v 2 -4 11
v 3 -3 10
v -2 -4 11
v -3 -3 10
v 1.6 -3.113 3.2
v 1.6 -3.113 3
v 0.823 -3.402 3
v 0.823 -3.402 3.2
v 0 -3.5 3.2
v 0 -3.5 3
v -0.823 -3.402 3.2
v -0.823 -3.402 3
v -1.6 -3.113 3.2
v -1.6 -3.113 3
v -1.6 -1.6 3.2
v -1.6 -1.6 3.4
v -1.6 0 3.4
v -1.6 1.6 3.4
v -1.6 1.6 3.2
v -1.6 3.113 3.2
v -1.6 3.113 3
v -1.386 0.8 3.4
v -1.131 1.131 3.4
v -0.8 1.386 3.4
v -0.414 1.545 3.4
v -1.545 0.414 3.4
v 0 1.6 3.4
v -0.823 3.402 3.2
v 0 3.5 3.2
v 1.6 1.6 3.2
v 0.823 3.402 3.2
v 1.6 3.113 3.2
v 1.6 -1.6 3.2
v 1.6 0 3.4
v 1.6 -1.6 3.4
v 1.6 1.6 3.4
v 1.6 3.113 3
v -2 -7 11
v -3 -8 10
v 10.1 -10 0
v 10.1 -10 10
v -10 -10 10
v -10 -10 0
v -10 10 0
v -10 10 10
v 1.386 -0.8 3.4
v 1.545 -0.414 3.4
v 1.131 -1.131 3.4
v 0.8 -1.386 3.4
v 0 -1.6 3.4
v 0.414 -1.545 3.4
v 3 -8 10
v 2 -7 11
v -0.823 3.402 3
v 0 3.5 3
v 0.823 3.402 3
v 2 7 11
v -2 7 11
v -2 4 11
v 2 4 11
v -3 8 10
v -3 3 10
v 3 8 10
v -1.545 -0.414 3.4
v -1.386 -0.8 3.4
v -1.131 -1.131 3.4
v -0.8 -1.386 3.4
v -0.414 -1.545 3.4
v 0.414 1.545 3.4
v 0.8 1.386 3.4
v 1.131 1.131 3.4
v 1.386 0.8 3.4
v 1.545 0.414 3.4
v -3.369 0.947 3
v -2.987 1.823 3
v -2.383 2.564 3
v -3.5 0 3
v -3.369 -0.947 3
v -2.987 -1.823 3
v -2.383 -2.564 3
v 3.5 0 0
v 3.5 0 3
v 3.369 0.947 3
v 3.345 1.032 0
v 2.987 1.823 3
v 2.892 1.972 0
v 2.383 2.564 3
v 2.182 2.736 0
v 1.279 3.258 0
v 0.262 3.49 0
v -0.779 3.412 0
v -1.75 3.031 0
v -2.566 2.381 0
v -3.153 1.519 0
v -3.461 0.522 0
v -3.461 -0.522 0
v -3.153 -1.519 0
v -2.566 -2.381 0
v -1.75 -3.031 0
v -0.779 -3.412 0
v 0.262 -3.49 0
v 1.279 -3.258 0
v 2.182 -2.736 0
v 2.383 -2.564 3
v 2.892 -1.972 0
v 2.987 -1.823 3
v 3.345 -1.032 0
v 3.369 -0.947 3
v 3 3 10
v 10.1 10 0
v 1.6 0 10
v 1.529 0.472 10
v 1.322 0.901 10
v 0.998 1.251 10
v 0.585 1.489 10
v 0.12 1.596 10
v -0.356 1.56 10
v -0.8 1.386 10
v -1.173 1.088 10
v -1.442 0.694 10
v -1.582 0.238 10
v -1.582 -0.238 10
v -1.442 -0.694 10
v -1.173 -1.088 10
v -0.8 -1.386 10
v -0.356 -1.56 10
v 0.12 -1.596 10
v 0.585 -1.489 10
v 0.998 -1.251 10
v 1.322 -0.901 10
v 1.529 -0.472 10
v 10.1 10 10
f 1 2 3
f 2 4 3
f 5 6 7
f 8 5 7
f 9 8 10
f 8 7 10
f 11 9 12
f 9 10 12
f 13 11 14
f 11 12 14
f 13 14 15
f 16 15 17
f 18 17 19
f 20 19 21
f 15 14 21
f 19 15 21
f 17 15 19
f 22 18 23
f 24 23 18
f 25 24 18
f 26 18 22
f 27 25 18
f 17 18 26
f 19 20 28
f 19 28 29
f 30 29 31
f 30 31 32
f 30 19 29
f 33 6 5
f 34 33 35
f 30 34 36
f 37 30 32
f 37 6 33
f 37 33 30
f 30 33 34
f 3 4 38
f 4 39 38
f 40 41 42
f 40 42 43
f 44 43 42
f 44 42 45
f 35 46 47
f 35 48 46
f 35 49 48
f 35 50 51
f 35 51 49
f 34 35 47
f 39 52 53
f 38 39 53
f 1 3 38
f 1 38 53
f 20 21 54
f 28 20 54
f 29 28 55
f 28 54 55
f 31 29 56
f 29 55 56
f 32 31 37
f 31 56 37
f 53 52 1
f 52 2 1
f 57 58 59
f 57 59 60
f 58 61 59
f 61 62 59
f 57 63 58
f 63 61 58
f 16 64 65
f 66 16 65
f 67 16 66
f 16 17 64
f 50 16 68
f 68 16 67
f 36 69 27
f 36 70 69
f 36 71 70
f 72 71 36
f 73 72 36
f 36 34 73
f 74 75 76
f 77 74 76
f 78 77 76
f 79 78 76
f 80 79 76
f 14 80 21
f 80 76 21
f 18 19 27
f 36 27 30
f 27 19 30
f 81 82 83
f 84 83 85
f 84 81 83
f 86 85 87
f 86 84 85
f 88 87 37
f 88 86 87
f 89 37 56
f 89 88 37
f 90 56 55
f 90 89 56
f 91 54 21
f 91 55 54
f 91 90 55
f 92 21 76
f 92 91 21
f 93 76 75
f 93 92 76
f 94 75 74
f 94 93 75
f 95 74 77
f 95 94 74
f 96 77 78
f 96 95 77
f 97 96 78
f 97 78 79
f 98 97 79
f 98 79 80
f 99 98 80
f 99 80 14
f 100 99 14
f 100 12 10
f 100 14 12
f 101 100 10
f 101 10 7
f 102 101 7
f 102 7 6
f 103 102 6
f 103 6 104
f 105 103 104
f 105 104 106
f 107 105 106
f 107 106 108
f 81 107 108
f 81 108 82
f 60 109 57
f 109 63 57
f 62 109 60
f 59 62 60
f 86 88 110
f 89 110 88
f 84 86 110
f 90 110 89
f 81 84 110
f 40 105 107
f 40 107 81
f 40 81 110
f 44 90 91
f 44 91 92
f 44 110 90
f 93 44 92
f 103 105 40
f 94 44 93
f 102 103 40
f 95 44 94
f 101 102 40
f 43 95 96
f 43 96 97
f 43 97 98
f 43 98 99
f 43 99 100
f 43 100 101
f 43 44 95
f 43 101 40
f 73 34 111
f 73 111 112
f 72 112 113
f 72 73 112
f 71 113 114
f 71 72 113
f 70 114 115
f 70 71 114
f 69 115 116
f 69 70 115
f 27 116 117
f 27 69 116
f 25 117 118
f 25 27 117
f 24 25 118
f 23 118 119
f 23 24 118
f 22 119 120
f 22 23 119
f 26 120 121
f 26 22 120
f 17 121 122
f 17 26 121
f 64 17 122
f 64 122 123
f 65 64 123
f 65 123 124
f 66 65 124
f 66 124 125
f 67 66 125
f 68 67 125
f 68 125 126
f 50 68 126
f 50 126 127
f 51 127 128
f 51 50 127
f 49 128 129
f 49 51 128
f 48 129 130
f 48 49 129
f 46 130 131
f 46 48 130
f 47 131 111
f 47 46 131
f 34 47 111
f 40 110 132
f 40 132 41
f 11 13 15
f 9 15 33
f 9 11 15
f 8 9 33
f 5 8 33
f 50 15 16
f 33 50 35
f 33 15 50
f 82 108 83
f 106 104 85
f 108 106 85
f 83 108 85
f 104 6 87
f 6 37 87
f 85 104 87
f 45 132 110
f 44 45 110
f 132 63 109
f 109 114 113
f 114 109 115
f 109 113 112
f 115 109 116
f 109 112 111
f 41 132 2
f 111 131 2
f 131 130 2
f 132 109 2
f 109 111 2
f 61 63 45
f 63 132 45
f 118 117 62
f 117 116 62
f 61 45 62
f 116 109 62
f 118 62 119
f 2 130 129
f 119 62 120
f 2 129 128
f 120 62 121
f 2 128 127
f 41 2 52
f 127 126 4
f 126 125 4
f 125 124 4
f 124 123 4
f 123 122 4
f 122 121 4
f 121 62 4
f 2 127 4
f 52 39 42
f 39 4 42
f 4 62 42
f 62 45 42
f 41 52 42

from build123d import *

# Parameters (mm, degrees)
SKETCH001_W       = 20
SKETCH001_H       = 20
PAD_DEPTH         = 10
SKETCH003_R       = 1.6
POCKET_DEPTH      = 0.001
POCKET_DEPTH_BACK = 10.001
SKETCH002_R       = 3.5
POCKET001_DEPTH   = 3
POCKET002_DEPTH   = 0.2
SKETCH005_W       = 3.2
SKETCH005_H       = 3.2
POCKET003_DEPTH   = 0.2
SKETCH006_W       = 6
SKETCH006_H       = 5
PAD001_DEPTH      = 1
PAD001_TAPER      = 45
PAD001_FACE19_W   = 20
PAD001_FACE19_H   = 10
PAD002_DEPTH      = 0.1


with BuildPart() as part:
    # Sketch001 → Pad (new body)
    with BuildSketch(Plane.XY):
        Rectangle(SKETCH001_W, SKETCH001_H)
    extrude(amount=PAD_DEPTH)

    # Sketch003 → Pocket (cut, two sides)
    with BuildSketch(Plane.XY) as pocket_sk:
        Circle(SKETCH003_R)
    extrude(amount=-POCKET_DEPTH, mode=Mode.SUBTRACT)
    extrude(pocket_sk.sketch, amount=POCKET_DEPTH_BACK, mode=Mode.SUBTRACT)

    # Sketch002 → Pocket001 (cut)
    with BuildSketch(Plane.XY):
        Circle(SKETCH002_R)
    extrude(amount=POCKET001_DEPTH, mode=Mode.SUBTRACT)

    # Sketch004 (on Face9 of Pocket001) → Pocket002 (cut)
    with BuildSketch(Plane(origin=(0, 0, 3), x_dir=(1, 0, 0), z_dir=(0, 0, -1))):
        with BuildLine():
            ThreePointArc((1.6, 3.1128764833), (0, 3.5), (-1.6, 3.1128764833))
            Line((-1.6, 3.1128764833), (-1.6, -3.1128764833))
            ThreePointArc((-1.6, -3.1128764833), (0, -3.5), (1.6, -3.1128764833))
            Line((1.6, 3.1128764833), (1.6, -3.1128764833))
        make_face()
    extrude(amount=-POCKET002_DEPTH, mode=Mode.SUBTRACT)

    # Sketch005 (on Face13 of Pocket002) → Pocket003 (cut)
    with BuildSketch(Plane(origin=(0, 0, 3.2), x_dir=(1, 0, 0), z_dir=(0, 0, -1))):
        Rectangle(SKETCH005_W, SKETCH005_H)
    extrude(amount=-POCKET003_DEPTH, mode=Mode.SUBTRACT)

    # Sketch006 (on Face11 of Pocket003) → Pad001 (join)
    with BuildSketch(Plane.XY.offset(10)):
        with Locations((0, 5.5)):
            Rectangle(SKETCH006_W, SKETCH006_H)
        with Locations((0, -5.5)):
            Rectangle(SKETCH006_W, SKETCH006_H)
    extrude(amount=PAD001_DEPTH, taper=PAD001_TAPER)

    # Pad001 Face19 → Pad002 (add)
    with BuildSketch(Plane(origin=(10, 0, 5), x_dir=(0, -1, 0), z_dir=(1, 0, 0))):
        Rectangle(PAD001_FACE19_W, PAD001_FACE19_H)
    extrude(amount=PAD002_DEPTH)


solid = part.part
